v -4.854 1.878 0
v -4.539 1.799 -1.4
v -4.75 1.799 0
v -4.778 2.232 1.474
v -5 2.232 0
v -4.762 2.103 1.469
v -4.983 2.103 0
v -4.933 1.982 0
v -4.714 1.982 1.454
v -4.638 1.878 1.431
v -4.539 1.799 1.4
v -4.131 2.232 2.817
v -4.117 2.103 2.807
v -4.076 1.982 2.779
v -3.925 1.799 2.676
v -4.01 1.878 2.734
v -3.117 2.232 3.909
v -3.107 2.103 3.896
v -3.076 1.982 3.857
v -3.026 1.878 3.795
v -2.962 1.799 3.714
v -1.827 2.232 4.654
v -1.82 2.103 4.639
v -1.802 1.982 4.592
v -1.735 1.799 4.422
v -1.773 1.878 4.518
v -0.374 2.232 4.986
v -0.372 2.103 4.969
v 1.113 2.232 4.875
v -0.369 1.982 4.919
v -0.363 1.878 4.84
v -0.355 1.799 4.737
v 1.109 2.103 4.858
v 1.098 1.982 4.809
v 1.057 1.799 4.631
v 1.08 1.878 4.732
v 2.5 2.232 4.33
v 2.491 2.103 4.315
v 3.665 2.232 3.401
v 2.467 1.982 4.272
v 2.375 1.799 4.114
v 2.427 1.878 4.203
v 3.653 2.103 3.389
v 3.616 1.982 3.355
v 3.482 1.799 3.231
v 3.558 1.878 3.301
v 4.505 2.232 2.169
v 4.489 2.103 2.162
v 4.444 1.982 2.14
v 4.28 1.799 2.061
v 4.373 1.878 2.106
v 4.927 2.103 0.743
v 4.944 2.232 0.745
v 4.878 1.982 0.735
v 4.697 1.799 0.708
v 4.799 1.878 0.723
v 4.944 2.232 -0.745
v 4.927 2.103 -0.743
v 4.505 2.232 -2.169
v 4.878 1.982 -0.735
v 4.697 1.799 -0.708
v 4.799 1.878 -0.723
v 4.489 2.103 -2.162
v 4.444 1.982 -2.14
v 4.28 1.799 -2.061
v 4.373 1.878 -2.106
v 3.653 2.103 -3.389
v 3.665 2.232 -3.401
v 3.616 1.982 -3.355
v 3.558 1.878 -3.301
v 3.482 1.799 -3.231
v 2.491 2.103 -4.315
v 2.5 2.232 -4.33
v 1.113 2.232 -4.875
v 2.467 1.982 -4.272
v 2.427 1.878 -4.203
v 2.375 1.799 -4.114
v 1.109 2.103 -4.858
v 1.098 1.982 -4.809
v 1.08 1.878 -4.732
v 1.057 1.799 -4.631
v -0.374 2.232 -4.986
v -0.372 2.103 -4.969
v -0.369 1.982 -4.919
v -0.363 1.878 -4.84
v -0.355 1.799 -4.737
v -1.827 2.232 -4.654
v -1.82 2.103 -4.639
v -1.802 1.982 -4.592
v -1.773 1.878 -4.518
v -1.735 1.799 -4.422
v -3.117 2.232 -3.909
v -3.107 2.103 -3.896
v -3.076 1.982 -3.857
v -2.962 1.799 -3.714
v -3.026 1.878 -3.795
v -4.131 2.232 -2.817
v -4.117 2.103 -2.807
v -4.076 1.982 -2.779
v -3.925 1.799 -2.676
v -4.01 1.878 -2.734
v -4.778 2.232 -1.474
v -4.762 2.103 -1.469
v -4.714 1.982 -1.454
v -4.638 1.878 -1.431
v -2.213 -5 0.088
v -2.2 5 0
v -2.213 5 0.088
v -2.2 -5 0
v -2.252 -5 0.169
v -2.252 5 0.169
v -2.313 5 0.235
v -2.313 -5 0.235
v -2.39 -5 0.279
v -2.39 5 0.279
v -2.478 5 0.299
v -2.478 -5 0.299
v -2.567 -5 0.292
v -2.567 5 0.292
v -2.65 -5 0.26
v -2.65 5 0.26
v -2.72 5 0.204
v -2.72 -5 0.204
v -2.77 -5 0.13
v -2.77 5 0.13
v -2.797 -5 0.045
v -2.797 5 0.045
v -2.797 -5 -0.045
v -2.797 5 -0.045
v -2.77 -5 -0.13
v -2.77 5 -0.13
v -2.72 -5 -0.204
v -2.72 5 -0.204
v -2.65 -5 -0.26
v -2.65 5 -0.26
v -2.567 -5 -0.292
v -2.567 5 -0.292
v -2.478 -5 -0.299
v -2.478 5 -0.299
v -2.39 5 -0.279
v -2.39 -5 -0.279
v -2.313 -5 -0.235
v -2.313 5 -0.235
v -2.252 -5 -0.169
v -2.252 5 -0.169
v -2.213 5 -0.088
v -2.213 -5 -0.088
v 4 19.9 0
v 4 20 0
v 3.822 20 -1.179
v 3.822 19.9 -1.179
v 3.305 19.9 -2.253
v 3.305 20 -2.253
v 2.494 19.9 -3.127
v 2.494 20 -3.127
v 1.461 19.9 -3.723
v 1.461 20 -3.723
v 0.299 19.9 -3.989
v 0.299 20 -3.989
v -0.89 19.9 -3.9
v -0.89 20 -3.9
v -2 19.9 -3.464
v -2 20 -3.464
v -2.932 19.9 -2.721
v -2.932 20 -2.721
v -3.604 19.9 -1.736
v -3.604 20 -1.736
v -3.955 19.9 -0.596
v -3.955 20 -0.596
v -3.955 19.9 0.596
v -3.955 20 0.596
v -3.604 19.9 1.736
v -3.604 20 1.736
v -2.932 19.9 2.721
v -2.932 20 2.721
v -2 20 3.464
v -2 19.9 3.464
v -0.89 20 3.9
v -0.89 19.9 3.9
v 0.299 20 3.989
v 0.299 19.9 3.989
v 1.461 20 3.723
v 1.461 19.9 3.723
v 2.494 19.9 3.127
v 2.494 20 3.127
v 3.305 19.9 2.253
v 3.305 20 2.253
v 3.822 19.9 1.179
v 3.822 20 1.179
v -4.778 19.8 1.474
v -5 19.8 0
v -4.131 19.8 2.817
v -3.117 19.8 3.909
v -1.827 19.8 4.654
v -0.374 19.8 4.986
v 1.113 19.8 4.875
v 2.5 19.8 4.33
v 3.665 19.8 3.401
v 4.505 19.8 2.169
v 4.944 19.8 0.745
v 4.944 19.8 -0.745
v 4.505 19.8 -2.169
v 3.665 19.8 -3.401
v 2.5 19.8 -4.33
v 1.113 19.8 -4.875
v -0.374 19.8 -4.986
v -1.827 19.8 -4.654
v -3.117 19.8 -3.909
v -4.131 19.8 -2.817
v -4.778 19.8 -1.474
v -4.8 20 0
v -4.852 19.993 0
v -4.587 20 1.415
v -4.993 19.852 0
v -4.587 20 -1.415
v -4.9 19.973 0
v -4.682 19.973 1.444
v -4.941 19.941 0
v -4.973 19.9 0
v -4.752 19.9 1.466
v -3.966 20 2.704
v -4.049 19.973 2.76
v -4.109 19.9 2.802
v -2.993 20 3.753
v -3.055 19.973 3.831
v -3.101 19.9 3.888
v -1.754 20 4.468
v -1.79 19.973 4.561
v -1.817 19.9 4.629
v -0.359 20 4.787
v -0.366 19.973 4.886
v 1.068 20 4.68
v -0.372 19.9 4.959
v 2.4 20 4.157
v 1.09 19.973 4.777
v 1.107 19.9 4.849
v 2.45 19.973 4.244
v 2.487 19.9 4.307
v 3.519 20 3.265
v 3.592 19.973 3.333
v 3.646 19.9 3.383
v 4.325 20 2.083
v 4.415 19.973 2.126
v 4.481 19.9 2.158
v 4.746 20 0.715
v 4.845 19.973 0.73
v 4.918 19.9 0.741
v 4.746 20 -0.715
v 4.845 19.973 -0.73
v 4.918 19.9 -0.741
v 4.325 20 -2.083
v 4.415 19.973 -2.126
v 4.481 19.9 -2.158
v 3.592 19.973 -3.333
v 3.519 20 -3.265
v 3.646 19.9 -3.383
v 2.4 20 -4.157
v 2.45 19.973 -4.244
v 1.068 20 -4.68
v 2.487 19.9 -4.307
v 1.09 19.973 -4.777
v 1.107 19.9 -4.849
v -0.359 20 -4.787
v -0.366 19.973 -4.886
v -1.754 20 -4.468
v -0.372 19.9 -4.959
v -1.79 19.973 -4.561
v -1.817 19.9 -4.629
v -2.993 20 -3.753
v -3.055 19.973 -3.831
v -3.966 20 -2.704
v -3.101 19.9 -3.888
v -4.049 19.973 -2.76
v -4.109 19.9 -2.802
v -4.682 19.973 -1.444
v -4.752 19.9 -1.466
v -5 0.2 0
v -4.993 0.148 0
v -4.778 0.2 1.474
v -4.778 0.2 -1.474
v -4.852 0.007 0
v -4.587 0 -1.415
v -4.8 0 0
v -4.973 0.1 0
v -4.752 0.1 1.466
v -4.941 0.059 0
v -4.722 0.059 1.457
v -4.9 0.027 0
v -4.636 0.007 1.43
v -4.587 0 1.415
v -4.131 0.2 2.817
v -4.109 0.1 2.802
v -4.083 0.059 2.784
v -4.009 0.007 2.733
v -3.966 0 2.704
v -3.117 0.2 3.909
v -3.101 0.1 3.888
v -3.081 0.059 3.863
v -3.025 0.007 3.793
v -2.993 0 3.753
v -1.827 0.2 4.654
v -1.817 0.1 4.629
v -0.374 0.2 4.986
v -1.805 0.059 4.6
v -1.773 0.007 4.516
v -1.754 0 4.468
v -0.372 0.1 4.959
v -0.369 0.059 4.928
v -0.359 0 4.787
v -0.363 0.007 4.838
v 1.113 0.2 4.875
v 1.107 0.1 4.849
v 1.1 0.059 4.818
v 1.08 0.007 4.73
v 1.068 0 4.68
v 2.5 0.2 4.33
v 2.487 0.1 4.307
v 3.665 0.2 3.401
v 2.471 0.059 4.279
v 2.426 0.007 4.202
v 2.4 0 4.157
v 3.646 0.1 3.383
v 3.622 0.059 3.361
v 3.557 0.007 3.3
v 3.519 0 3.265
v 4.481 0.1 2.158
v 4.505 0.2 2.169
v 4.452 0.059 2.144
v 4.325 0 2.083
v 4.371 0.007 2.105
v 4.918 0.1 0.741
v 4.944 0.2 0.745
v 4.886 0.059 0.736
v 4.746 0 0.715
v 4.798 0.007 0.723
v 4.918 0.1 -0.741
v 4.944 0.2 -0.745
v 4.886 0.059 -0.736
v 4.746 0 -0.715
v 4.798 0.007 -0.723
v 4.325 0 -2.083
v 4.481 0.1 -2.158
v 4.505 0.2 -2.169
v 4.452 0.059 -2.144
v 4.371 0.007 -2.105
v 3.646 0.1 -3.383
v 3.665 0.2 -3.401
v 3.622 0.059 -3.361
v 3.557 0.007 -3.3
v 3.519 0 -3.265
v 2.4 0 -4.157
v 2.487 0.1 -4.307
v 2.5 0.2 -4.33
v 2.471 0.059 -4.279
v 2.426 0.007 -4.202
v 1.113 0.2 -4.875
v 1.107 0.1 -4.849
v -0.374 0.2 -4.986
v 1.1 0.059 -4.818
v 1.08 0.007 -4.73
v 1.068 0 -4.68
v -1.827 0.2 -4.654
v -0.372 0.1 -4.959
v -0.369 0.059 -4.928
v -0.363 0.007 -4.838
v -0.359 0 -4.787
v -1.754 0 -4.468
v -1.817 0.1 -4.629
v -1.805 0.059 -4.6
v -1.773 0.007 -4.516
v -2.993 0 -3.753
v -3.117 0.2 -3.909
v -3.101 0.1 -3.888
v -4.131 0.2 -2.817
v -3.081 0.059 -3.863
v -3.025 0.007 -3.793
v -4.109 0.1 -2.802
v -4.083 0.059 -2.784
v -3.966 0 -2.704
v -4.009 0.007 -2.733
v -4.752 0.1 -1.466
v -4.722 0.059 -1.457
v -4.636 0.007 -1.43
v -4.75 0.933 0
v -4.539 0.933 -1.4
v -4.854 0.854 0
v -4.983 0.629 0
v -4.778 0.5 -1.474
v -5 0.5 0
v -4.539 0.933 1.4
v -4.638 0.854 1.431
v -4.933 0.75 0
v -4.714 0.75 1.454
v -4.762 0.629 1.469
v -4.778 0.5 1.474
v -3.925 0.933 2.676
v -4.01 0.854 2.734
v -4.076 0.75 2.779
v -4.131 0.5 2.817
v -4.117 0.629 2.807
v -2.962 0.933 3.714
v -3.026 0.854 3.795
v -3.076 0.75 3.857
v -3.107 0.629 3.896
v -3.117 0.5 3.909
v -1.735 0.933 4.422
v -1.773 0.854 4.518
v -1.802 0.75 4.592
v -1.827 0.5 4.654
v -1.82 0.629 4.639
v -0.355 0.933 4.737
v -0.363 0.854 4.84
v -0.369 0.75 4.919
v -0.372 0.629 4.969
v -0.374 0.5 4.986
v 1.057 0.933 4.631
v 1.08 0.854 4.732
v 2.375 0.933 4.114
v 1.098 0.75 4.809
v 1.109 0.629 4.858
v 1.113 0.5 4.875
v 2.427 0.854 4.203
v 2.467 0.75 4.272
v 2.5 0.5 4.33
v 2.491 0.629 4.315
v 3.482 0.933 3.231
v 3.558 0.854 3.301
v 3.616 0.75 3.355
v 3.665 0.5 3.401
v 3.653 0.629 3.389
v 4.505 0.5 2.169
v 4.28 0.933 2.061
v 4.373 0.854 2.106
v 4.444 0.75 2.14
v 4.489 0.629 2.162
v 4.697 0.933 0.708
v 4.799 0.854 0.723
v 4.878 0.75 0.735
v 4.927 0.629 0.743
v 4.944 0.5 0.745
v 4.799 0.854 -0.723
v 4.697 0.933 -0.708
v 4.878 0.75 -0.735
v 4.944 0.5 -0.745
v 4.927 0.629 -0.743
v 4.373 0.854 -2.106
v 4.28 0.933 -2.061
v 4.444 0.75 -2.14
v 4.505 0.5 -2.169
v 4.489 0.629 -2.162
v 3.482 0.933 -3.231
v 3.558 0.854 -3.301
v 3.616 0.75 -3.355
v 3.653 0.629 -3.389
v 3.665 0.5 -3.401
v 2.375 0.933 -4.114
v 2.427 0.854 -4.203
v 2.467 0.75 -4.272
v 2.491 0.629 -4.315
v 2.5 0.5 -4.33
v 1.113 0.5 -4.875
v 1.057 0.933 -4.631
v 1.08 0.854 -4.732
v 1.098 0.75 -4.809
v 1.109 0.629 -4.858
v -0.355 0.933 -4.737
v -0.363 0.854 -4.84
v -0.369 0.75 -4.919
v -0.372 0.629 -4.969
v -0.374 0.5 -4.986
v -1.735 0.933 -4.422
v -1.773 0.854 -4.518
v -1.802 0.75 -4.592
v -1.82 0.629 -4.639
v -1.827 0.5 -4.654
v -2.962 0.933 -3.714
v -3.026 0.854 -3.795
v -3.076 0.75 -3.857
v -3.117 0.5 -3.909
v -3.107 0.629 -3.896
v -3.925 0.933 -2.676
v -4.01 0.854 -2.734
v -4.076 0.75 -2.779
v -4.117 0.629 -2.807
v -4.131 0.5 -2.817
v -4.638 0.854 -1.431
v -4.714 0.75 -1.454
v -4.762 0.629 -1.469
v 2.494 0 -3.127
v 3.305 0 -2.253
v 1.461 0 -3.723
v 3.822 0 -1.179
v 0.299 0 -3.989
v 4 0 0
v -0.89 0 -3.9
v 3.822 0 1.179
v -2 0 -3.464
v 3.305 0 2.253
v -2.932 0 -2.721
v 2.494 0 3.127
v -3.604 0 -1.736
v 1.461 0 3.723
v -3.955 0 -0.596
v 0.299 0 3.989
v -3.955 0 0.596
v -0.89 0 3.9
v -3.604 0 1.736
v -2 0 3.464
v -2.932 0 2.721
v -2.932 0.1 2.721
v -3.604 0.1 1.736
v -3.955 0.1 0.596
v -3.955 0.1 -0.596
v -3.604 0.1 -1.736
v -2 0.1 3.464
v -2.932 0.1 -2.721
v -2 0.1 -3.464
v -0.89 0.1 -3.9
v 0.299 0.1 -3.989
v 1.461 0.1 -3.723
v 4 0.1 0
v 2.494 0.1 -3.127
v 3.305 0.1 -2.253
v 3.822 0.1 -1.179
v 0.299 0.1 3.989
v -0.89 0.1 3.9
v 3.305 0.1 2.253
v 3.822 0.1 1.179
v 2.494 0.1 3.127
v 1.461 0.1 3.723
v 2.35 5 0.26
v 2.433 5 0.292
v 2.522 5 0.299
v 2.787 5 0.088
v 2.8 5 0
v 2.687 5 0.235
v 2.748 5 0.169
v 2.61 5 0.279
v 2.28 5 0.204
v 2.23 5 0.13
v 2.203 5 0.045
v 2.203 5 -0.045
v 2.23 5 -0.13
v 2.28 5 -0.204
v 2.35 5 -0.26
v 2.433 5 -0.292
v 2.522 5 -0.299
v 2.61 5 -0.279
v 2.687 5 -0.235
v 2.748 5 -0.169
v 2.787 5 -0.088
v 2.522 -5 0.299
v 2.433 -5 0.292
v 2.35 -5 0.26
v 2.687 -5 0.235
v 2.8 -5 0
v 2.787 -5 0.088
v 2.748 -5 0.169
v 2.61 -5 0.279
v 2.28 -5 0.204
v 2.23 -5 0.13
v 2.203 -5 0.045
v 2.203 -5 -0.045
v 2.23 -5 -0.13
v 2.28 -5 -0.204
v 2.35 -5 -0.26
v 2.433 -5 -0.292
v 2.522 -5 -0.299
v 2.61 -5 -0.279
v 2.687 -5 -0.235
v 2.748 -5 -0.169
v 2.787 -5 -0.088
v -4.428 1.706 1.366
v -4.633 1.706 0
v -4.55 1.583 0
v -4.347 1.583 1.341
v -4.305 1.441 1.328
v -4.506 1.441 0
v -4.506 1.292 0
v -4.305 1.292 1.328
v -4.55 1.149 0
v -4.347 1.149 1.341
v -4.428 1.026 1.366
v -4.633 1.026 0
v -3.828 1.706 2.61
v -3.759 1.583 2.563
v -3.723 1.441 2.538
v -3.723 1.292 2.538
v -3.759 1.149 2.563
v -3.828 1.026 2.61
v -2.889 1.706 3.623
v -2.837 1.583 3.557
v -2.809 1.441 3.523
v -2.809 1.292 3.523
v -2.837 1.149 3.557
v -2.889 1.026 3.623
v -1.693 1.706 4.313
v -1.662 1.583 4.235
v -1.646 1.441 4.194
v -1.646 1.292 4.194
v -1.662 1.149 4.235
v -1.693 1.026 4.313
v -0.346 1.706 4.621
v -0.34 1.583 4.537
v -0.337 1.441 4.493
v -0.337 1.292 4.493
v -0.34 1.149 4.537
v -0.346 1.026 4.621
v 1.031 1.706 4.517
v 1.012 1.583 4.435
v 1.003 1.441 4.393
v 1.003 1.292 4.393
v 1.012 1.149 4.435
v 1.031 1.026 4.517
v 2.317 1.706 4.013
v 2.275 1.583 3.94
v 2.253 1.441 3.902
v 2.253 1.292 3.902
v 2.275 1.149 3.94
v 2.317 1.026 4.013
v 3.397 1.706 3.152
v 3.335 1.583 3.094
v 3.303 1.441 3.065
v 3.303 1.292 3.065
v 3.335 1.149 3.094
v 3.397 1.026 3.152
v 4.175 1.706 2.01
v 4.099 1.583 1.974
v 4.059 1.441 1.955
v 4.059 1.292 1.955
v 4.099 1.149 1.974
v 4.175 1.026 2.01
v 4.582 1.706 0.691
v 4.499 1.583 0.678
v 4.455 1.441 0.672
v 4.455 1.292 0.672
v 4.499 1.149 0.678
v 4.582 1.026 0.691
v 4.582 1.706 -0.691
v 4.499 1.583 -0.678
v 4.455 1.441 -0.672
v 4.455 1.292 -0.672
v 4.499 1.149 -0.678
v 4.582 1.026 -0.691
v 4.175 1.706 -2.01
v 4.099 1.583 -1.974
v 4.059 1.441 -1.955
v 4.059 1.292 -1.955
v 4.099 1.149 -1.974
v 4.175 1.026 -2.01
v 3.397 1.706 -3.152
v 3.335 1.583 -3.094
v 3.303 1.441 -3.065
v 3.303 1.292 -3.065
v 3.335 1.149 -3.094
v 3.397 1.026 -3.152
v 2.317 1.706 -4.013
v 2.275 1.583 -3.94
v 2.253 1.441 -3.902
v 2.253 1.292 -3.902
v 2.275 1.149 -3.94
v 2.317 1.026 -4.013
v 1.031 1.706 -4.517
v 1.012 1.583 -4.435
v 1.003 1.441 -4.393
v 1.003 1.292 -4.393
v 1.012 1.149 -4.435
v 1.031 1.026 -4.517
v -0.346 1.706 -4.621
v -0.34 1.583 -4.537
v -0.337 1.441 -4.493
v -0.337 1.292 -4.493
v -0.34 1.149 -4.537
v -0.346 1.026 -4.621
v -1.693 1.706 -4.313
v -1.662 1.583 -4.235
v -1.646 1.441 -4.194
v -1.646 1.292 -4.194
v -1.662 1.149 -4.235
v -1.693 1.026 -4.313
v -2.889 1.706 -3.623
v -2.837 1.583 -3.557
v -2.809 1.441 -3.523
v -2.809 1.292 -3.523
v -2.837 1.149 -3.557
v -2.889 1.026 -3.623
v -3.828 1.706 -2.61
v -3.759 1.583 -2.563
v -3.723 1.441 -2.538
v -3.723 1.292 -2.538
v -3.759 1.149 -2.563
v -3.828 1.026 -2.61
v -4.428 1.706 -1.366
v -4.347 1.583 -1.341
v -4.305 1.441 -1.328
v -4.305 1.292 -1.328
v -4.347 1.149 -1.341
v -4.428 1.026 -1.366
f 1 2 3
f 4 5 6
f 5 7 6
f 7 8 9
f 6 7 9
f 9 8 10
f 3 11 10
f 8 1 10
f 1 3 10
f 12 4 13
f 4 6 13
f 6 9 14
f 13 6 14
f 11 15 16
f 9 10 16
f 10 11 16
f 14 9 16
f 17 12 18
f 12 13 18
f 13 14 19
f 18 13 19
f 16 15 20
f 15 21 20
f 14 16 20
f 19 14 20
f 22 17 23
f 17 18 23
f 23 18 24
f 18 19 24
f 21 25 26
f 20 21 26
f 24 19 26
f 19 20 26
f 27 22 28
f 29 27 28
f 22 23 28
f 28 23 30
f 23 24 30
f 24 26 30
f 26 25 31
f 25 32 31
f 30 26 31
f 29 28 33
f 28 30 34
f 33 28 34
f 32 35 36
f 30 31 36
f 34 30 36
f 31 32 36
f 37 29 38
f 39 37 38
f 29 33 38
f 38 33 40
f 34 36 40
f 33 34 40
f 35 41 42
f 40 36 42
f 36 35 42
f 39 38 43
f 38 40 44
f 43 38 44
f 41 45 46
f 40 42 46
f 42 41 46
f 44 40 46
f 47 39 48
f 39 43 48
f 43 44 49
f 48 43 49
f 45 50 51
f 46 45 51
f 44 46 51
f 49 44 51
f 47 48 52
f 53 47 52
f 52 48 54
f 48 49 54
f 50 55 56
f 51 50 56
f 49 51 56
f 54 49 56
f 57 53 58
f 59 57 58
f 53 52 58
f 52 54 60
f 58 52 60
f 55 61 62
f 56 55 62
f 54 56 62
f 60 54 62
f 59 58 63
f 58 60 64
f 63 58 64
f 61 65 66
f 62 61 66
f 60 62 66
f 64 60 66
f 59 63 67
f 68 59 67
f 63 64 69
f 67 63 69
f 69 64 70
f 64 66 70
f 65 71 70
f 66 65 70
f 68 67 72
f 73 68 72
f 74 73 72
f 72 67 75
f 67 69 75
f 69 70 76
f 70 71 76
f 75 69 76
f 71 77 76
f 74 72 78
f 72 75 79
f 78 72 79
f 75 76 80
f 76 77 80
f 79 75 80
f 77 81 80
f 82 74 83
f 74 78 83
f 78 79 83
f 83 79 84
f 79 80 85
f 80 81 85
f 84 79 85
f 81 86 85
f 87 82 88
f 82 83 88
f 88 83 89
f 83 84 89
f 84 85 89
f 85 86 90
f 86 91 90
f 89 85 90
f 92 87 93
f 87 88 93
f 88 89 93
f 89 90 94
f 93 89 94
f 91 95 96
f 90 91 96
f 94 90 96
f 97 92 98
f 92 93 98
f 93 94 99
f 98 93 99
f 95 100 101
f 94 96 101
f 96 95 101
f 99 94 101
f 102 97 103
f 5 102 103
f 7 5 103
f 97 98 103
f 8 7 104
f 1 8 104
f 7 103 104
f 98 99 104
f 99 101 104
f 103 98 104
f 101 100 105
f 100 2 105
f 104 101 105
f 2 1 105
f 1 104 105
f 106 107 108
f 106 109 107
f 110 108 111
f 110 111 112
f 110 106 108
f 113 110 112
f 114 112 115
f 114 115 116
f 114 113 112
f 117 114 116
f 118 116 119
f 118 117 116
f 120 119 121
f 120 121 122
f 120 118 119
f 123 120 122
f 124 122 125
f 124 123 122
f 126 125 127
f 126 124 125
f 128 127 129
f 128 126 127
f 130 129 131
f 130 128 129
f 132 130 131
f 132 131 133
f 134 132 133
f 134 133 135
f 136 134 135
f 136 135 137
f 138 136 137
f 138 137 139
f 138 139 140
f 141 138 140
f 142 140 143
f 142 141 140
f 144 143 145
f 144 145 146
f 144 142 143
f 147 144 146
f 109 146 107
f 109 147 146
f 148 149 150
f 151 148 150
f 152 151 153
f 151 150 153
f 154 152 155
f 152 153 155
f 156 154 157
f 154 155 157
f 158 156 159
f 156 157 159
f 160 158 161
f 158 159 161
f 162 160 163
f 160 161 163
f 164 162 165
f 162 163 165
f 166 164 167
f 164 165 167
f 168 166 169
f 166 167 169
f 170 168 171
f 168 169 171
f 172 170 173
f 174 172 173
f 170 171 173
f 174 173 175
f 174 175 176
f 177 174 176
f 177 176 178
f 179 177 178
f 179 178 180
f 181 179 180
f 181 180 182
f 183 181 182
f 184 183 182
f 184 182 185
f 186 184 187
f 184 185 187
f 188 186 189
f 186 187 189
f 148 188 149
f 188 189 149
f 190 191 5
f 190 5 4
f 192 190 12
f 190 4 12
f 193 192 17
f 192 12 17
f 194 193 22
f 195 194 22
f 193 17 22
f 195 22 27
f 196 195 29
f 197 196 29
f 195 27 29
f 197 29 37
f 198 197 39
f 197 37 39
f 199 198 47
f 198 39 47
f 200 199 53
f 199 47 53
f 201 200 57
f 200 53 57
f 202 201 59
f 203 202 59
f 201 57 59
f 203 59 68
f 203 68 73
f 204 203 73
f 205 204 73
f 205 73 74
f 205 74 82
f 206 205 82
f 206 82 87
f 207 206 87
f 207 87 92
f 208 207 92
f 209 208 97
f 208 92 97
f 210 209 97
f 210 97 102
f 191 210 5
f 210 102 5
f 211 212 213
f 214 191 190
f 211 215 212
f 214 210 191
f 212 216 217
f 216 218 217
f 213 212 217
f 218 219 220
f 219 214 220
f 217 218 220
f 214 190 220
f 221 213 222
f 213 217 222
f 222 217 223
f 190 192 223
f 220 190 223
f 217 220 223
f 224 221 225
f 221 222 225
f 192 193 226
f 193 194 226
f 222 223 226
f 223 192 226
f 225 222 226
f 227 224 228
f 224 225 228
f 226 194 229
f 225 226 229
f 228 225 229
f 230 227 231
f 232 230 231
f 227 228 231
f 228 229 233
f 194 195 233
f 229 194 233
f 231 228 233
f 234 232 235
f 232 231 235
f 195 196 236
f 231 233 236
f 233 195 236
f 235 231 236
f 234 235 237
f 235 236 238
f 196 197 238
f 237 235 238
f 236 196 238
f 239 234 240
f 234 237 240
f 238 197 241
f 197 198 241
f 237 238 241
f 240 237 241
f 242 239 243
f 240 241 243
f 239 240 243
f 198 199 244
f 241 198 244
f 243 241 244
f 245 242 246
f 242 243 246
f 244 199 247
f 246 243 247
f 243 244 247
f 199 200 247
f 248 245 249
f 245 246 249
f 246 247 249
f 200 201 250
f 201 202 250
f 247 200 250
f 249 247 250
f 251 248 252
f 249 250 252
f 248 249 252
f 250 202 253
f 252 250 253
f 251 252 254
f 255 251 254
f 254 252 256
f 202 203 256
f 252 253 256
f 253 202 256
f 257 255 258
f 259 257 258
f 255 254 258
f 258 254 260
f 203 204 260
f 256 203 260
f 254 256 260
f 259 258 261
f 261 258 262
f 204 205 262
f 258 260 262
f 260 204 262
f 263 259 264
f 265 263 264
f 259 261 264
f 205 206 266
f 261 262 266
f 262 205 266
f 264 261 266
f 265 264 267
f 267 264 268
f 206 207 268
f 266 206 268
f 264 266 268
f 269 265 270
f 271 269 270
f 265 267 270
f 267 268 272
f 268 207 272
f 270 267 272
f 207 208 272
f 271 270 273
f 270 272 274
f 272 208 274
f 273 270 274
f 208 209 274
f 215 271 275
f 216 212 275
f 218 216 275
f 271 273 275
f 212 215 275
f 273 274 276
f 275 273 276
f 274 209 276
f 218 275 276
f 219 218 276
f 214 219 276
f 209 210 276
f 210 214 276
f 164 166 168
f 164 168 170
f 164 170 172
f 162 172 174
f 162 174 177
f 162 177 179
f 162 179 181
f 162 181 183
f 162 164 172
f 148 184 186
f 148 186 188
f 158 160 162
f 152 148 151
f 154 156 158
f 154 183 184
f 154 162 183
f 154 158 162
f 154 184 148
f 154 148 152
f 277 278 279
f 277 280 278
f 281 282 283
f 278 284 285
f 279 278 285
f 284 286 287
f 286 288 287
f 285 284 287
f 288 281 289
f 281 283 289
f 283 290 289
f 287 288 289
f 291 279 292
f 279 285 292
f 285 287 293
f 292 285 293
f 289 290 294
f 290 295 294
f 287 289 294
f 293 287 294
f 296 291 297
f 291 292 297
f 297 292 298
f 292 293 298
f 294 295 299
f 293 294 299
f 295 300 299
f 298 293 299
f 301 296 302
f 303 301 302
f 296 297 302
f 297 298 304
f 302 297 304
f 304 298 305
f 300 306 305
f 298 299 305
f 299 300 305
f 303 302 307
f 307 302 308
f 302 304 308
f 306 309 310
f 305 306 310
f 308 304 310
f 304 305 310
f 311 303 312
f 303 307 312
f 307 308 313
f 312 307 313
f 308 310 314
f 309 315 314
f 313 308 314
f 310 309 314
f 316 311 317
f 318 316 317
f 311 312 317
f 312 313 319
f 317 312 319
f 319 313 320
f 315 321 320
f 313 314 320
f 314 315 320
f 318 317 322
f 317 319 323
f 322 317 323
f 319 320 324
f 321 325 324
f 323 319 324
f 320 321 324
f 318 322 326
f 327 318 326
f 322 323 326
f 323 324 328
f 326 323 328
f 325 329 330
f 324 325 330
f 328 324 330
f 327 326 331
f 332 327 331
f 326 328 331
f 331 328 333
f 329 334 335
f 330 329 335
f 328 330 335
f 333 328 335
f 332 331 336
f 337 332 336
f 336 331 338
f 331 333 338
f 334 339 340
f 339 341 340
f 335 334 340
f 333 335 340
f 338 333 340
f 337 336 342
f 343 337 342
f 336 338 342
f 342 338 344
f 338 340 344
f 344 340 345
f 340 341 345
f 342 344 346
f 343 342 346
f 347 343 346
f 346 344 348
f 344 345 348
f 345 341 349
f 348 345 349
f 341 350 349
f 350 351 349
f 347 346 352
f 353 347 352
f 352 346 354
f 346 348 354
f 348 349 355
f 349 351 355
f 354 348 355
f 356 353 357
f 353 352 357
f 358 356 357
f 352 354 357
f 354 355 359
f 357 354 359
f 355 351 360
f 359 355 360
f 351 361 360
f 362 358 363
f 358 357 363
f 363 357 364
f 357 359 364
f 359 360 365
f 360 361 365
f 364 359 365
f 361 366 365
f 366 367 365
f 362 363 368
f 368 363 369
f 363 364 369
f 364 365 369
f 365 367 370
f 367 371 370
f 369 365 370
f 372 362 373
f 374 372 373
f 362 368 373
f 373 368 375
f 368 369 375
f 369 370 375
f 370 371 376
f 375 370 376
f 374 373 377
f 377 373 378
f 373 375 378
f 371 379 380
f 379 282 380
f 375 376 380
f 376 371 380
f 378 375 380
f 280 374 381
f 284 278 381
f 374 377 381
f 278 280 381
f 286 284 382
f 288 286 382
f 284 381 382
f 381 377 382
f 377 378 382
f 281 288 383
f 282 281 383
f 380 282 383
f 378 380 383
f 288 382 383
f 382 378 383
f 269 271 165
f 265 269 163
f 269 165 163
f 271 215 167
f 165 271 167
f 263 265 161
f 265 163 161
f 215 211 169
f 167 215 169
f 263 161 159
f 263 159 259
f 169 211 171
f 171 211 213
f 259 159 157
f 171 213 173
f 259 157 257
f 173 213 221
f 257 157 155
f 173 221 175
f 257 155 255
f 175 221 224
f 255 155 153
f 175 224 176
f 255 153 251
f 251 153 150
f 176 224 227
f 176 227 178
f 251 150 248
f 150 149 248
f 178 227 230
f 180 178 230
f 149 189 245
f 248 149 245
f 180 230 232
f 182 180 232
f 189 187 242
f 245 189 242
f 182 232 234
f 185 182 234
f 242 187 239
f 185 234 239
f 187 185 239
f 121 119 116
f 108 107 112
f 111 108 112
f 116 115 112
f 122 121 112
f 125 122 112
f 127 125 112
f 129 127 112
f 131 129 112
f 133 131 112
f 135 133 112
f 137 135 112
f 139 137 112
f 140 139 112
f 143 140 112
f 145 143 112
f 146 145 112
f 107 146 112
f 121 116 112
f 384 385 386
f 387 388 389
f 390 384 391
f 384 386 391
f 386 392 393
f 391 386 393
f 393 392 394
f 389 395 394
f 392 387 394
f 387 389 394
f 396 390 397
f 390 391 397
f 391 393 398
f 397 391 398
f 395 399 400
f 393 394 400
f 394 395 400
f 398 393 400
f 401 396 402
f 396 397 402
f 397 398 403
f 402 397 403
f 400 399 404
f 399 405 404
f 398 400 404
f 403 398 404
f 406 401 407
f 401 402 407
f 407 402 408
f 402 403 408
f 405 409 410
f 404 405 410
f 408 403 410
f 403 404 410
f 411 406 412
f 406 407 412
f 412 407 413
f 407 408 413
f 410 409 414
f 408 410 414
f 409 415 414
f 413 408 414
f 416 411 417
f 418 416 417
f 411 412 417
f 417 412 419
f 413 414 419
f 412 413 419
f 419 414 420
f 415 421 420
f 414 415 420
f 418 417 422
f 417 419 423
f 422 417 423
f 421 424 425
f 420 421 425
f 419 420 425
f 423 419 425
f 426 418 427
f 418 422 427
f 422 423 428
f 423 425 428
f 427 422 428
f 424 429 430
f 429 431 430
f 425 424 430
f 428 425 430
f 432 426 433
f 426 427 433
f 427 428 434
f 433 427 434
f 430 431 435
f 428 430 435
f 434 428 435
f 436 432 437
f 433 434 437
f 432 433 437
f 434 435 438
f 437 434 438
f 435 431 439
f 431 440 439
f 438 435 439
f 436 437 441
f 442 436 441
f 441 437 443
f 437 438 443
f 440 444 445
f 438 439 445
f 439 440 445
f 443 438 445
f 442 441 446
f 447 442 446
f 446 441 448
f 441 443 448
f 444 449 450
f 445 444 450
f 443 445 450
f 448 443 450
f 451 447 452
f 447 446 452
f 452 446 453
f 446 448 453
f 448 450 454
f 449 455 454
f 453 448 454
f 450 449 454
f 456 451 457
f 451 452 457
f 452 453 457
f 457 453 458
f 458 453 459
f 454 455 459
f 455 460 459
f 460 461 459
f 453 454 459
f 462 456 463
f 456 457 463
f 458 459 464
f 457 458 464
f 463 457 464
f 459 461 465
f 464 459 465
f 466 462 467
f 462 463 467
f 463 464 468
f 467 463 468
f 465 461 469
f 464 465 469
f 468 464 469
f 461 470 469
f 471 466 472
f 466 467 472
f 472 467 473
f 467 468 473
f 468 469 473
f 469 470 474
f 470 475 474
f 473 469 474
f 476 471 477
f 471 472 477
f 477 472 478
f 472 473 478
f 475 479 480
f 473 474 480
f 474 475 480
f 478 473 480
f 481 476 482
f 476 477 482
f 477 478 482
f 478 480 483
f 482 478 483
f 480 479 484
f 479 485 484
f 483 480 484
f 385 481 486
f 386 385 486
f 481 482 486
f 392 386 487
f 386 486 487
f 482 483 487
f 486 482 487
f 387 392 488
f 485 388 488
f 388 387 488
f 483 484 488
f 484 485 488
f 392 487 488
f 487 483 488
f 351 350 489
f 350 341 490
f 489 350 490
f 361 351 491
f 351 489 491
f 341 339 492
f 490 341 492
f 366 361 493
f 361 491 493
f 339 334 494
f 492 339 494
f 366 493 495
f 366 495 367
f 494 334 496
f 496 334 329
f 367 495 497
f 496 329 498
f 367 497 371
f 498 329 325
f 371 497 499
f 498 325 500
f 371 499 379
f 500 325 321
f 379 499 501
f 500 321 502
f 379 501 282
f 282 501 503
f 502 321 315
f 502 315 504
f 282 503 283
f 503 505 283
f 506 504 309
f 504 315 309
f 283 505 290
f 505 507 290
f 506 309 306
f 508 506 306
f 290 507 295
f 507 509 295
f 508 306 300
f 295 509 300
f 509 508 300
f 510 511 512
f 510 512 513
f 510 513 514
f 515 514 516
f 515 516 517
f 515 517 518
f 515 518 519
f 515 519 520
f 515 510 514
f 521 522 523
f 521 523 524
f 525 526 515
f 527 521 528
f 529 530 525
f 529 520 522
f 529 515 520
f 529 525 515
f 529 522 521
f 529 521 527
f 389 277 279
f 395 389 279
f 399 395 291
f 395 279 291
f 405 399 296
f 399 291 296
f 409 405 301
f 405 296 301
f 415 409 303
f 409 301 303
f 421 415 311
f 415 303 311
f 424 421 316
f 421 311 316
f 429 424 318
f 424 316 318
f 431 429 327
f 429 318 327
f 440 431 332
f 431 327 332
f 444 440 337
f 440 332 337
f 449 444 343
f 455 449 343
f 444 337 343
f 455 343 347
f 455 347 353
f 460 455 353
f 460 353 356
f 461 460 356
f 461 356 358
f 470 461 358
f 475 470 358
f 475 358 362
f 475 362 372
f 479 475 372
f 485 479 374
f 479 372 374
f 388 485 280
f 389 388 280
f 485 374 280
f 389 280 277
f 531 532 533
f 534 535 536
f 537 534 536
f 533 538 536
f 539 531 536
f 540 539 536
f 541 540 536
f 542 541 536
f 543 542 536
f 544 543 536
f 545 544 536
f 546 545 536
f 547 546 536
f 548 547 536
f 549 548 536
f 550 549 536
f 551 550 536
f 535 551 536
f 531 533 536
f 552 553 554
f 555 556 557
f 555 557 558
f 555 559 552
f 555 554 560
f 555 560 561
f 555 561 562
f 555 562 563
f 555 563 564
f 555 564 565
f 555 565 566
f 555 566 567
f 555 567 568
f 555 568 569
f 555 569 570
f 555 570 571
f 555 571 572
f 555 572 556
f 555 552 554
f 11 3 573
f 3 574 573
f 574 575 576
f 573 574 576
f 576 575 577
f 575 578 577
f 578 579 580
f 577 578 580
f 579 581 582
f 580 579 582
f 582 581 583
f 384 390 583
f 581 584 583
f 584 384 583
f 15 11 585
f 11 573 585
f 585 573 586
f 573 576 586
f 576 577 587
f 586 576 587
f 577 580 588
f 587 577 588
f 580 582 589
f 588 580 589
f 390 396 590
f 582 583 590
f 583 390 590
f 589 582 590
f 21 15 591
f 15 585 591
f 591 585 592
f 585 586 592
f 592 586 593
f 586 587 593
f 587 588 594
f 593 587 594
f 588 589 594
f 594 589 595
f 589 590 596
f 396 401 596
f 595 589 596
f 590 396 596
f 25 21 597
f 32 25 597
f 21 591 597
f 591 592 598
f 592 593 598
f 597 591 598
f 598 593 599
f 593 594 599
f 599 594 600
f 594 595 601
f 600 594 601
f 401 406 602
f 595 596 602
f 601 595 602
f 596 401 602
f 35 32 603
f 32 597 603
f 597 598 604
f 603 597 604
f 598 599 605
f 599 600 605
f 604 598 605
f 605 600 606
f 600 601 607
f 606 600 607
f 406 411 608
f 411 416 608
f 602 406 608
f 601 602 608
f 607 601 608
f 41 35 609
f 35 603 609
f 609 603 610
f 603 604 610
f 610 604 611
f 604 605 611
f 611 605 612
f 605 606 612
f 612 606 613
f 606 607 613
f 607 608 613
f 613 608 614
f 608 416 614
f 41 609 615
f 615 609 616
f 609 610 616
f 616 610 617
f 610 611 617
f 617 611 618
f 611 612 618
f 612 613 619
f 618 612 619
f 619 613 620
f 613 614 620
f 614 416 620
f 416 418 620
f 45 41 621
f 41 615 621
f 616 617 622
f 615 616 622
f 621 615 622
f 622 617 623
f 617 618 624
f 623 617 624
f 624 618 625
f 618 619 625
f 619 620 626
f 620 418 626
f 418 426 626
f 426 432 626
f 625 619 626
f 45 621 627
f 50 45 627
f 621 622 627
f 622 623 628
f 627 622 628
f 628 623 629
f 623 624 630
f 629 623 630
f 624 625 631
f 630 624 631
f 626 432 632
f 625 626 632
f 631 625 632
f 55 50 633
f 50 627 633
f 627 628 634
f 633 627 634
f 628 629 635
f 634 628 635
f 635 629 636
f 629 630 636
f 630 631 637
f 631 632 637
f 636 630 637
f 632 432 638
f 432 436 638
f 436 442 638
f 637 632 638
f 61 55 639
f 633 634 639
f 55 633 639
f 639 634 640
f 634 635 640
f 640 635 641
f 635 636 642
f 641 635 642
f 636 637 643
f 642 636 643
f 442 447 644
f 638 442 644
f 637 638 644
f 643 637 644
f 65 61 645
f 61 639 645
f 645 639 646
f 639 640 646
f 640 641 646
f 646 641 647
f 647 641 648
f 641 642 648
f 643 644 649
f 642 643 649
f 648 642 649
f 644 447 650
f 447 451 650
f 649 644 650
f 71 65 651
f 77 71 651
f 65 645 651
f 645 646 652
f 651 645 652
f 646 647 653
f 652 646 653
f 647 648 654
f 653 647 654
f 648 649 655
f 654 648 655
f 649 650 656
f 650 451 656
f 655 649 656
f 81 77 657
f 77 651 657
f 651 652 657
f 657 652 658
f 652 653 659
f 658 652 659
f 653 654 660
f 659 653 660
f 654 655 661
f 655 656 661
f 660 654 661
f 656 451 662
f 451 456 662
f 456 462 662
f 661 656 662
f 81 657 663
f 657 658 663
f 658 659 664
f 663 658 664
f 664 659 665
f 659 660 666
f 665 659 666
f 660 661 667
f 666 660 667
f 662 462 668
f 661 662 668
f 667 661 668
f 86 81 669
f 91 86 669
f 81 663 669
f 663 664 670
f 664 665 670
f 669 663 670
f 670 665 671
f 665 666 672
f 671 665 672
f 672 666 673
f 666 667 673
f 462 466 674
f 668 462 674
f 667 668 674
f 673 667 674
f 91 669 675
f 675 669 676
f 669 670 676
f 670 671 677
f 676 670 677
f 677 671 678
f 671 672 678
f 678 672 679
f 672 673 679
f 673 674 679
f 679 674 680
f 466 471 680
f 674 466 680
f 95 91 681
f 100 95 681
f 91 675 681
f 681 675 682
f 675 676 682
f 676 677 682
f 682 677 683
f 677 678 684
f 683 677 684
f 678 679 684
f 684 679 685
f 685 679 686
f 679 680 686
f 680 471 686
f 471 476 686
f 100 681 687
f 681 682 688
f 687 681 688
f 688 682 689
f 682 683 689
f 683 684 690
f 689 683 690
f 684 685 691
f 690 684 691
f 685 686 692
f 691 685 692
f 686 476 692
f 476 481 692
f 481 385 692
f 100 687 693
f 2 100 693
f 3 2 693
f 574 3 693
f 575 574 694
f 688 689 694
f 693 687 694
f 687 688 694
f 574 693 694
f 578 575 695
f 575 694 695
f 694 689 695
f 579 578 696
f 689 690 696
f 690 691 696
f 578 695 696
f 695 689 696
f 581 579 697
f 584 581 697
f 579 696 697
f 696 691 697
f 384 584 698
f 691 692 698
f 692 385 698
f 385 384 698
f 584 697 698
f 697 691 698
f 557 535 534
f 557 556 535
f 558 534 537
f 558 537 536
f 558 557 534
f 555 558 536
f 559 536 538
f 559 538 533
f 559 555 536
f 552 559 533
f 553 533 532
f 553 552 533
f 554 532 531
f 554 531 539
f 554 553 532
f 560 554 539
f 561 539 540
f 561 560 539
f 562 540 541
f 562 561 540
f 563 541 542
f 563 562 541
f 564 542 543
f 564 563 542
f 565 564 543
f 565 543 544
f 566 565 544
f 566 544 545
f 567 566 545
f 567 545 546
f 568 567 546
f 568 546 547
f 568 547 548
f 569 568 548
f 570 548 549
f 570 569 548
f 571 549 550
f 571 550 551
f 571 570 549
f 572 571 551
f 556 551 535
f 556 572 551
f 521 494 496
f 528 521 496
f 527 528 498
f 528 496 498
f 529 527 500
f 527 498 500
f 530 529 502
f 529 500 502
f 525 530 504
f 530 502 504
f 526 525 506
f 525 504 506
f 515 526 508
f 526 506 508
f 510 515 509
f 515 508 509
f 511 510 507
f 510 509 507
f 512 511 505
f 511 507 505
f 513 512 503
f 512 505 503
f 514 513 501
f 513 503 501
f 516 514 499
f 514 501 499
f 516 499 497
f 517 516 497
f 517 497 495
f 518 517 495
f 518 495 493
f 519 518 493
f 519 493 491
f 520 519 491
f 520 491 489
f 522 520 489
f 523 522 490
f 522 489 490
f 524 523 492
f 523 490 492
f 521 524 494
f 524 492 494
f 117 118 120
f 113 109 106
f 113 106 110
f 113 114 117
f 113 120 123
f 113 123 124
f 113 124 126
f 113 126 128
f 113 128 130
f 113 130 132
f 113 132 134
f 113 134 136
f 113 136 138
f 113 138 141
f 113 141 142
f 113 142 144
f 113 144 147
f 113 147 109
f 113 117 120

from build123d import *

# Parameters (mm, degrees)
FILLET2_R             = 0.2
SKETCH3_R             = 4
CUT_EXTRUDE1_DEPTH    = 0.1
SKETCH4_R             = 4
CUT_EXTRUDE2_DEPTH    = 0.1
SKETCH2_R             = 0.3
BOSS_EXTRUDE1_DEPTH   = 5
BOSS_EXTRUDE1_2_DEPTH = 5


with BuildPart() as part:
    # Sketch1 → Revolve1 (revolve)
    with BuildSketch(Plane.XY):
        with BuildLine():
            Line((0, 0), (0, 20))
            Line((0, 20), (-5, 20))
            Line((-5, 20), (-5, 2.232050808))
            ThreePointArc((-5, 2.232050808), (-4.933012702, 1.982050808), (-4.75, 1.799038106))
            ThreePointArc((-4.75, 1.799038106), (-4.5, 1.366025404), (-4.75, 0.933012702))
            ThreePointArc((-4.75, 0.933012702), (-4.933012702, 0.75), (-5, 0.5))
            Line((-5, 0.5), (-5, 0))
            Line((-5, 0), (0, 0))
        make_face()
    revolve(axis=Axis((0, 0, 0), (0, 1, 0)))

    # Fillet2
    fillet2_edges = [part.edges().sort_by_distance(p)[0] for p in [
        (5, 0, 0),
        (5, 20, 0),
    ]]
    fillet(fillet2_edges, radius=FILLET2_R)

    # Sketch3 → Cut-Extrude1 (cut)
    with BuildSketch(Plane(origin=(0, 20, 0), x_dir=(1, 0, 0), z_dir=(0, 1, 0))):
        Circle(SKETCH3_R)
    extrude(amount=-CUT_EXTRUDE1_DEPTH, mode=Mode.SUBTRACT)

    # Sketch4 → Cut-Extrude2 (cut)
    with BuildSketch(Plane.XZ):
        Circle(SKETCH4_R)
    extrude(amount=-CUT_EXTRUDE2_DEPTH, mode=Mode.SUBTRACT)


with BuildPart() as body_2:
    # Sketch2 → Boss-Extrude1 (new body, symmetric)
    with BuildSketch(Plane.XZ):
        with Locations((-2.5, 0)):
            Circle(SKETCH2_R)
    extrude(amount=BOSS_EXTRUDE1_DEPTH, both=True)


with BuildPart() as body_3:
    # Sketch2 → Boss-Extrude1 2 (new body, symmetric)
    with BuildSketch(Plane.XZ):
        with Locations((2.5, 0)):
            Circle(SKETCH2_R)
    extrude(amount=BOSS_EXTRUDE1_2_DEPTH, both=True)


solid = Compound([part.part, body_2.part, body_3.part])
